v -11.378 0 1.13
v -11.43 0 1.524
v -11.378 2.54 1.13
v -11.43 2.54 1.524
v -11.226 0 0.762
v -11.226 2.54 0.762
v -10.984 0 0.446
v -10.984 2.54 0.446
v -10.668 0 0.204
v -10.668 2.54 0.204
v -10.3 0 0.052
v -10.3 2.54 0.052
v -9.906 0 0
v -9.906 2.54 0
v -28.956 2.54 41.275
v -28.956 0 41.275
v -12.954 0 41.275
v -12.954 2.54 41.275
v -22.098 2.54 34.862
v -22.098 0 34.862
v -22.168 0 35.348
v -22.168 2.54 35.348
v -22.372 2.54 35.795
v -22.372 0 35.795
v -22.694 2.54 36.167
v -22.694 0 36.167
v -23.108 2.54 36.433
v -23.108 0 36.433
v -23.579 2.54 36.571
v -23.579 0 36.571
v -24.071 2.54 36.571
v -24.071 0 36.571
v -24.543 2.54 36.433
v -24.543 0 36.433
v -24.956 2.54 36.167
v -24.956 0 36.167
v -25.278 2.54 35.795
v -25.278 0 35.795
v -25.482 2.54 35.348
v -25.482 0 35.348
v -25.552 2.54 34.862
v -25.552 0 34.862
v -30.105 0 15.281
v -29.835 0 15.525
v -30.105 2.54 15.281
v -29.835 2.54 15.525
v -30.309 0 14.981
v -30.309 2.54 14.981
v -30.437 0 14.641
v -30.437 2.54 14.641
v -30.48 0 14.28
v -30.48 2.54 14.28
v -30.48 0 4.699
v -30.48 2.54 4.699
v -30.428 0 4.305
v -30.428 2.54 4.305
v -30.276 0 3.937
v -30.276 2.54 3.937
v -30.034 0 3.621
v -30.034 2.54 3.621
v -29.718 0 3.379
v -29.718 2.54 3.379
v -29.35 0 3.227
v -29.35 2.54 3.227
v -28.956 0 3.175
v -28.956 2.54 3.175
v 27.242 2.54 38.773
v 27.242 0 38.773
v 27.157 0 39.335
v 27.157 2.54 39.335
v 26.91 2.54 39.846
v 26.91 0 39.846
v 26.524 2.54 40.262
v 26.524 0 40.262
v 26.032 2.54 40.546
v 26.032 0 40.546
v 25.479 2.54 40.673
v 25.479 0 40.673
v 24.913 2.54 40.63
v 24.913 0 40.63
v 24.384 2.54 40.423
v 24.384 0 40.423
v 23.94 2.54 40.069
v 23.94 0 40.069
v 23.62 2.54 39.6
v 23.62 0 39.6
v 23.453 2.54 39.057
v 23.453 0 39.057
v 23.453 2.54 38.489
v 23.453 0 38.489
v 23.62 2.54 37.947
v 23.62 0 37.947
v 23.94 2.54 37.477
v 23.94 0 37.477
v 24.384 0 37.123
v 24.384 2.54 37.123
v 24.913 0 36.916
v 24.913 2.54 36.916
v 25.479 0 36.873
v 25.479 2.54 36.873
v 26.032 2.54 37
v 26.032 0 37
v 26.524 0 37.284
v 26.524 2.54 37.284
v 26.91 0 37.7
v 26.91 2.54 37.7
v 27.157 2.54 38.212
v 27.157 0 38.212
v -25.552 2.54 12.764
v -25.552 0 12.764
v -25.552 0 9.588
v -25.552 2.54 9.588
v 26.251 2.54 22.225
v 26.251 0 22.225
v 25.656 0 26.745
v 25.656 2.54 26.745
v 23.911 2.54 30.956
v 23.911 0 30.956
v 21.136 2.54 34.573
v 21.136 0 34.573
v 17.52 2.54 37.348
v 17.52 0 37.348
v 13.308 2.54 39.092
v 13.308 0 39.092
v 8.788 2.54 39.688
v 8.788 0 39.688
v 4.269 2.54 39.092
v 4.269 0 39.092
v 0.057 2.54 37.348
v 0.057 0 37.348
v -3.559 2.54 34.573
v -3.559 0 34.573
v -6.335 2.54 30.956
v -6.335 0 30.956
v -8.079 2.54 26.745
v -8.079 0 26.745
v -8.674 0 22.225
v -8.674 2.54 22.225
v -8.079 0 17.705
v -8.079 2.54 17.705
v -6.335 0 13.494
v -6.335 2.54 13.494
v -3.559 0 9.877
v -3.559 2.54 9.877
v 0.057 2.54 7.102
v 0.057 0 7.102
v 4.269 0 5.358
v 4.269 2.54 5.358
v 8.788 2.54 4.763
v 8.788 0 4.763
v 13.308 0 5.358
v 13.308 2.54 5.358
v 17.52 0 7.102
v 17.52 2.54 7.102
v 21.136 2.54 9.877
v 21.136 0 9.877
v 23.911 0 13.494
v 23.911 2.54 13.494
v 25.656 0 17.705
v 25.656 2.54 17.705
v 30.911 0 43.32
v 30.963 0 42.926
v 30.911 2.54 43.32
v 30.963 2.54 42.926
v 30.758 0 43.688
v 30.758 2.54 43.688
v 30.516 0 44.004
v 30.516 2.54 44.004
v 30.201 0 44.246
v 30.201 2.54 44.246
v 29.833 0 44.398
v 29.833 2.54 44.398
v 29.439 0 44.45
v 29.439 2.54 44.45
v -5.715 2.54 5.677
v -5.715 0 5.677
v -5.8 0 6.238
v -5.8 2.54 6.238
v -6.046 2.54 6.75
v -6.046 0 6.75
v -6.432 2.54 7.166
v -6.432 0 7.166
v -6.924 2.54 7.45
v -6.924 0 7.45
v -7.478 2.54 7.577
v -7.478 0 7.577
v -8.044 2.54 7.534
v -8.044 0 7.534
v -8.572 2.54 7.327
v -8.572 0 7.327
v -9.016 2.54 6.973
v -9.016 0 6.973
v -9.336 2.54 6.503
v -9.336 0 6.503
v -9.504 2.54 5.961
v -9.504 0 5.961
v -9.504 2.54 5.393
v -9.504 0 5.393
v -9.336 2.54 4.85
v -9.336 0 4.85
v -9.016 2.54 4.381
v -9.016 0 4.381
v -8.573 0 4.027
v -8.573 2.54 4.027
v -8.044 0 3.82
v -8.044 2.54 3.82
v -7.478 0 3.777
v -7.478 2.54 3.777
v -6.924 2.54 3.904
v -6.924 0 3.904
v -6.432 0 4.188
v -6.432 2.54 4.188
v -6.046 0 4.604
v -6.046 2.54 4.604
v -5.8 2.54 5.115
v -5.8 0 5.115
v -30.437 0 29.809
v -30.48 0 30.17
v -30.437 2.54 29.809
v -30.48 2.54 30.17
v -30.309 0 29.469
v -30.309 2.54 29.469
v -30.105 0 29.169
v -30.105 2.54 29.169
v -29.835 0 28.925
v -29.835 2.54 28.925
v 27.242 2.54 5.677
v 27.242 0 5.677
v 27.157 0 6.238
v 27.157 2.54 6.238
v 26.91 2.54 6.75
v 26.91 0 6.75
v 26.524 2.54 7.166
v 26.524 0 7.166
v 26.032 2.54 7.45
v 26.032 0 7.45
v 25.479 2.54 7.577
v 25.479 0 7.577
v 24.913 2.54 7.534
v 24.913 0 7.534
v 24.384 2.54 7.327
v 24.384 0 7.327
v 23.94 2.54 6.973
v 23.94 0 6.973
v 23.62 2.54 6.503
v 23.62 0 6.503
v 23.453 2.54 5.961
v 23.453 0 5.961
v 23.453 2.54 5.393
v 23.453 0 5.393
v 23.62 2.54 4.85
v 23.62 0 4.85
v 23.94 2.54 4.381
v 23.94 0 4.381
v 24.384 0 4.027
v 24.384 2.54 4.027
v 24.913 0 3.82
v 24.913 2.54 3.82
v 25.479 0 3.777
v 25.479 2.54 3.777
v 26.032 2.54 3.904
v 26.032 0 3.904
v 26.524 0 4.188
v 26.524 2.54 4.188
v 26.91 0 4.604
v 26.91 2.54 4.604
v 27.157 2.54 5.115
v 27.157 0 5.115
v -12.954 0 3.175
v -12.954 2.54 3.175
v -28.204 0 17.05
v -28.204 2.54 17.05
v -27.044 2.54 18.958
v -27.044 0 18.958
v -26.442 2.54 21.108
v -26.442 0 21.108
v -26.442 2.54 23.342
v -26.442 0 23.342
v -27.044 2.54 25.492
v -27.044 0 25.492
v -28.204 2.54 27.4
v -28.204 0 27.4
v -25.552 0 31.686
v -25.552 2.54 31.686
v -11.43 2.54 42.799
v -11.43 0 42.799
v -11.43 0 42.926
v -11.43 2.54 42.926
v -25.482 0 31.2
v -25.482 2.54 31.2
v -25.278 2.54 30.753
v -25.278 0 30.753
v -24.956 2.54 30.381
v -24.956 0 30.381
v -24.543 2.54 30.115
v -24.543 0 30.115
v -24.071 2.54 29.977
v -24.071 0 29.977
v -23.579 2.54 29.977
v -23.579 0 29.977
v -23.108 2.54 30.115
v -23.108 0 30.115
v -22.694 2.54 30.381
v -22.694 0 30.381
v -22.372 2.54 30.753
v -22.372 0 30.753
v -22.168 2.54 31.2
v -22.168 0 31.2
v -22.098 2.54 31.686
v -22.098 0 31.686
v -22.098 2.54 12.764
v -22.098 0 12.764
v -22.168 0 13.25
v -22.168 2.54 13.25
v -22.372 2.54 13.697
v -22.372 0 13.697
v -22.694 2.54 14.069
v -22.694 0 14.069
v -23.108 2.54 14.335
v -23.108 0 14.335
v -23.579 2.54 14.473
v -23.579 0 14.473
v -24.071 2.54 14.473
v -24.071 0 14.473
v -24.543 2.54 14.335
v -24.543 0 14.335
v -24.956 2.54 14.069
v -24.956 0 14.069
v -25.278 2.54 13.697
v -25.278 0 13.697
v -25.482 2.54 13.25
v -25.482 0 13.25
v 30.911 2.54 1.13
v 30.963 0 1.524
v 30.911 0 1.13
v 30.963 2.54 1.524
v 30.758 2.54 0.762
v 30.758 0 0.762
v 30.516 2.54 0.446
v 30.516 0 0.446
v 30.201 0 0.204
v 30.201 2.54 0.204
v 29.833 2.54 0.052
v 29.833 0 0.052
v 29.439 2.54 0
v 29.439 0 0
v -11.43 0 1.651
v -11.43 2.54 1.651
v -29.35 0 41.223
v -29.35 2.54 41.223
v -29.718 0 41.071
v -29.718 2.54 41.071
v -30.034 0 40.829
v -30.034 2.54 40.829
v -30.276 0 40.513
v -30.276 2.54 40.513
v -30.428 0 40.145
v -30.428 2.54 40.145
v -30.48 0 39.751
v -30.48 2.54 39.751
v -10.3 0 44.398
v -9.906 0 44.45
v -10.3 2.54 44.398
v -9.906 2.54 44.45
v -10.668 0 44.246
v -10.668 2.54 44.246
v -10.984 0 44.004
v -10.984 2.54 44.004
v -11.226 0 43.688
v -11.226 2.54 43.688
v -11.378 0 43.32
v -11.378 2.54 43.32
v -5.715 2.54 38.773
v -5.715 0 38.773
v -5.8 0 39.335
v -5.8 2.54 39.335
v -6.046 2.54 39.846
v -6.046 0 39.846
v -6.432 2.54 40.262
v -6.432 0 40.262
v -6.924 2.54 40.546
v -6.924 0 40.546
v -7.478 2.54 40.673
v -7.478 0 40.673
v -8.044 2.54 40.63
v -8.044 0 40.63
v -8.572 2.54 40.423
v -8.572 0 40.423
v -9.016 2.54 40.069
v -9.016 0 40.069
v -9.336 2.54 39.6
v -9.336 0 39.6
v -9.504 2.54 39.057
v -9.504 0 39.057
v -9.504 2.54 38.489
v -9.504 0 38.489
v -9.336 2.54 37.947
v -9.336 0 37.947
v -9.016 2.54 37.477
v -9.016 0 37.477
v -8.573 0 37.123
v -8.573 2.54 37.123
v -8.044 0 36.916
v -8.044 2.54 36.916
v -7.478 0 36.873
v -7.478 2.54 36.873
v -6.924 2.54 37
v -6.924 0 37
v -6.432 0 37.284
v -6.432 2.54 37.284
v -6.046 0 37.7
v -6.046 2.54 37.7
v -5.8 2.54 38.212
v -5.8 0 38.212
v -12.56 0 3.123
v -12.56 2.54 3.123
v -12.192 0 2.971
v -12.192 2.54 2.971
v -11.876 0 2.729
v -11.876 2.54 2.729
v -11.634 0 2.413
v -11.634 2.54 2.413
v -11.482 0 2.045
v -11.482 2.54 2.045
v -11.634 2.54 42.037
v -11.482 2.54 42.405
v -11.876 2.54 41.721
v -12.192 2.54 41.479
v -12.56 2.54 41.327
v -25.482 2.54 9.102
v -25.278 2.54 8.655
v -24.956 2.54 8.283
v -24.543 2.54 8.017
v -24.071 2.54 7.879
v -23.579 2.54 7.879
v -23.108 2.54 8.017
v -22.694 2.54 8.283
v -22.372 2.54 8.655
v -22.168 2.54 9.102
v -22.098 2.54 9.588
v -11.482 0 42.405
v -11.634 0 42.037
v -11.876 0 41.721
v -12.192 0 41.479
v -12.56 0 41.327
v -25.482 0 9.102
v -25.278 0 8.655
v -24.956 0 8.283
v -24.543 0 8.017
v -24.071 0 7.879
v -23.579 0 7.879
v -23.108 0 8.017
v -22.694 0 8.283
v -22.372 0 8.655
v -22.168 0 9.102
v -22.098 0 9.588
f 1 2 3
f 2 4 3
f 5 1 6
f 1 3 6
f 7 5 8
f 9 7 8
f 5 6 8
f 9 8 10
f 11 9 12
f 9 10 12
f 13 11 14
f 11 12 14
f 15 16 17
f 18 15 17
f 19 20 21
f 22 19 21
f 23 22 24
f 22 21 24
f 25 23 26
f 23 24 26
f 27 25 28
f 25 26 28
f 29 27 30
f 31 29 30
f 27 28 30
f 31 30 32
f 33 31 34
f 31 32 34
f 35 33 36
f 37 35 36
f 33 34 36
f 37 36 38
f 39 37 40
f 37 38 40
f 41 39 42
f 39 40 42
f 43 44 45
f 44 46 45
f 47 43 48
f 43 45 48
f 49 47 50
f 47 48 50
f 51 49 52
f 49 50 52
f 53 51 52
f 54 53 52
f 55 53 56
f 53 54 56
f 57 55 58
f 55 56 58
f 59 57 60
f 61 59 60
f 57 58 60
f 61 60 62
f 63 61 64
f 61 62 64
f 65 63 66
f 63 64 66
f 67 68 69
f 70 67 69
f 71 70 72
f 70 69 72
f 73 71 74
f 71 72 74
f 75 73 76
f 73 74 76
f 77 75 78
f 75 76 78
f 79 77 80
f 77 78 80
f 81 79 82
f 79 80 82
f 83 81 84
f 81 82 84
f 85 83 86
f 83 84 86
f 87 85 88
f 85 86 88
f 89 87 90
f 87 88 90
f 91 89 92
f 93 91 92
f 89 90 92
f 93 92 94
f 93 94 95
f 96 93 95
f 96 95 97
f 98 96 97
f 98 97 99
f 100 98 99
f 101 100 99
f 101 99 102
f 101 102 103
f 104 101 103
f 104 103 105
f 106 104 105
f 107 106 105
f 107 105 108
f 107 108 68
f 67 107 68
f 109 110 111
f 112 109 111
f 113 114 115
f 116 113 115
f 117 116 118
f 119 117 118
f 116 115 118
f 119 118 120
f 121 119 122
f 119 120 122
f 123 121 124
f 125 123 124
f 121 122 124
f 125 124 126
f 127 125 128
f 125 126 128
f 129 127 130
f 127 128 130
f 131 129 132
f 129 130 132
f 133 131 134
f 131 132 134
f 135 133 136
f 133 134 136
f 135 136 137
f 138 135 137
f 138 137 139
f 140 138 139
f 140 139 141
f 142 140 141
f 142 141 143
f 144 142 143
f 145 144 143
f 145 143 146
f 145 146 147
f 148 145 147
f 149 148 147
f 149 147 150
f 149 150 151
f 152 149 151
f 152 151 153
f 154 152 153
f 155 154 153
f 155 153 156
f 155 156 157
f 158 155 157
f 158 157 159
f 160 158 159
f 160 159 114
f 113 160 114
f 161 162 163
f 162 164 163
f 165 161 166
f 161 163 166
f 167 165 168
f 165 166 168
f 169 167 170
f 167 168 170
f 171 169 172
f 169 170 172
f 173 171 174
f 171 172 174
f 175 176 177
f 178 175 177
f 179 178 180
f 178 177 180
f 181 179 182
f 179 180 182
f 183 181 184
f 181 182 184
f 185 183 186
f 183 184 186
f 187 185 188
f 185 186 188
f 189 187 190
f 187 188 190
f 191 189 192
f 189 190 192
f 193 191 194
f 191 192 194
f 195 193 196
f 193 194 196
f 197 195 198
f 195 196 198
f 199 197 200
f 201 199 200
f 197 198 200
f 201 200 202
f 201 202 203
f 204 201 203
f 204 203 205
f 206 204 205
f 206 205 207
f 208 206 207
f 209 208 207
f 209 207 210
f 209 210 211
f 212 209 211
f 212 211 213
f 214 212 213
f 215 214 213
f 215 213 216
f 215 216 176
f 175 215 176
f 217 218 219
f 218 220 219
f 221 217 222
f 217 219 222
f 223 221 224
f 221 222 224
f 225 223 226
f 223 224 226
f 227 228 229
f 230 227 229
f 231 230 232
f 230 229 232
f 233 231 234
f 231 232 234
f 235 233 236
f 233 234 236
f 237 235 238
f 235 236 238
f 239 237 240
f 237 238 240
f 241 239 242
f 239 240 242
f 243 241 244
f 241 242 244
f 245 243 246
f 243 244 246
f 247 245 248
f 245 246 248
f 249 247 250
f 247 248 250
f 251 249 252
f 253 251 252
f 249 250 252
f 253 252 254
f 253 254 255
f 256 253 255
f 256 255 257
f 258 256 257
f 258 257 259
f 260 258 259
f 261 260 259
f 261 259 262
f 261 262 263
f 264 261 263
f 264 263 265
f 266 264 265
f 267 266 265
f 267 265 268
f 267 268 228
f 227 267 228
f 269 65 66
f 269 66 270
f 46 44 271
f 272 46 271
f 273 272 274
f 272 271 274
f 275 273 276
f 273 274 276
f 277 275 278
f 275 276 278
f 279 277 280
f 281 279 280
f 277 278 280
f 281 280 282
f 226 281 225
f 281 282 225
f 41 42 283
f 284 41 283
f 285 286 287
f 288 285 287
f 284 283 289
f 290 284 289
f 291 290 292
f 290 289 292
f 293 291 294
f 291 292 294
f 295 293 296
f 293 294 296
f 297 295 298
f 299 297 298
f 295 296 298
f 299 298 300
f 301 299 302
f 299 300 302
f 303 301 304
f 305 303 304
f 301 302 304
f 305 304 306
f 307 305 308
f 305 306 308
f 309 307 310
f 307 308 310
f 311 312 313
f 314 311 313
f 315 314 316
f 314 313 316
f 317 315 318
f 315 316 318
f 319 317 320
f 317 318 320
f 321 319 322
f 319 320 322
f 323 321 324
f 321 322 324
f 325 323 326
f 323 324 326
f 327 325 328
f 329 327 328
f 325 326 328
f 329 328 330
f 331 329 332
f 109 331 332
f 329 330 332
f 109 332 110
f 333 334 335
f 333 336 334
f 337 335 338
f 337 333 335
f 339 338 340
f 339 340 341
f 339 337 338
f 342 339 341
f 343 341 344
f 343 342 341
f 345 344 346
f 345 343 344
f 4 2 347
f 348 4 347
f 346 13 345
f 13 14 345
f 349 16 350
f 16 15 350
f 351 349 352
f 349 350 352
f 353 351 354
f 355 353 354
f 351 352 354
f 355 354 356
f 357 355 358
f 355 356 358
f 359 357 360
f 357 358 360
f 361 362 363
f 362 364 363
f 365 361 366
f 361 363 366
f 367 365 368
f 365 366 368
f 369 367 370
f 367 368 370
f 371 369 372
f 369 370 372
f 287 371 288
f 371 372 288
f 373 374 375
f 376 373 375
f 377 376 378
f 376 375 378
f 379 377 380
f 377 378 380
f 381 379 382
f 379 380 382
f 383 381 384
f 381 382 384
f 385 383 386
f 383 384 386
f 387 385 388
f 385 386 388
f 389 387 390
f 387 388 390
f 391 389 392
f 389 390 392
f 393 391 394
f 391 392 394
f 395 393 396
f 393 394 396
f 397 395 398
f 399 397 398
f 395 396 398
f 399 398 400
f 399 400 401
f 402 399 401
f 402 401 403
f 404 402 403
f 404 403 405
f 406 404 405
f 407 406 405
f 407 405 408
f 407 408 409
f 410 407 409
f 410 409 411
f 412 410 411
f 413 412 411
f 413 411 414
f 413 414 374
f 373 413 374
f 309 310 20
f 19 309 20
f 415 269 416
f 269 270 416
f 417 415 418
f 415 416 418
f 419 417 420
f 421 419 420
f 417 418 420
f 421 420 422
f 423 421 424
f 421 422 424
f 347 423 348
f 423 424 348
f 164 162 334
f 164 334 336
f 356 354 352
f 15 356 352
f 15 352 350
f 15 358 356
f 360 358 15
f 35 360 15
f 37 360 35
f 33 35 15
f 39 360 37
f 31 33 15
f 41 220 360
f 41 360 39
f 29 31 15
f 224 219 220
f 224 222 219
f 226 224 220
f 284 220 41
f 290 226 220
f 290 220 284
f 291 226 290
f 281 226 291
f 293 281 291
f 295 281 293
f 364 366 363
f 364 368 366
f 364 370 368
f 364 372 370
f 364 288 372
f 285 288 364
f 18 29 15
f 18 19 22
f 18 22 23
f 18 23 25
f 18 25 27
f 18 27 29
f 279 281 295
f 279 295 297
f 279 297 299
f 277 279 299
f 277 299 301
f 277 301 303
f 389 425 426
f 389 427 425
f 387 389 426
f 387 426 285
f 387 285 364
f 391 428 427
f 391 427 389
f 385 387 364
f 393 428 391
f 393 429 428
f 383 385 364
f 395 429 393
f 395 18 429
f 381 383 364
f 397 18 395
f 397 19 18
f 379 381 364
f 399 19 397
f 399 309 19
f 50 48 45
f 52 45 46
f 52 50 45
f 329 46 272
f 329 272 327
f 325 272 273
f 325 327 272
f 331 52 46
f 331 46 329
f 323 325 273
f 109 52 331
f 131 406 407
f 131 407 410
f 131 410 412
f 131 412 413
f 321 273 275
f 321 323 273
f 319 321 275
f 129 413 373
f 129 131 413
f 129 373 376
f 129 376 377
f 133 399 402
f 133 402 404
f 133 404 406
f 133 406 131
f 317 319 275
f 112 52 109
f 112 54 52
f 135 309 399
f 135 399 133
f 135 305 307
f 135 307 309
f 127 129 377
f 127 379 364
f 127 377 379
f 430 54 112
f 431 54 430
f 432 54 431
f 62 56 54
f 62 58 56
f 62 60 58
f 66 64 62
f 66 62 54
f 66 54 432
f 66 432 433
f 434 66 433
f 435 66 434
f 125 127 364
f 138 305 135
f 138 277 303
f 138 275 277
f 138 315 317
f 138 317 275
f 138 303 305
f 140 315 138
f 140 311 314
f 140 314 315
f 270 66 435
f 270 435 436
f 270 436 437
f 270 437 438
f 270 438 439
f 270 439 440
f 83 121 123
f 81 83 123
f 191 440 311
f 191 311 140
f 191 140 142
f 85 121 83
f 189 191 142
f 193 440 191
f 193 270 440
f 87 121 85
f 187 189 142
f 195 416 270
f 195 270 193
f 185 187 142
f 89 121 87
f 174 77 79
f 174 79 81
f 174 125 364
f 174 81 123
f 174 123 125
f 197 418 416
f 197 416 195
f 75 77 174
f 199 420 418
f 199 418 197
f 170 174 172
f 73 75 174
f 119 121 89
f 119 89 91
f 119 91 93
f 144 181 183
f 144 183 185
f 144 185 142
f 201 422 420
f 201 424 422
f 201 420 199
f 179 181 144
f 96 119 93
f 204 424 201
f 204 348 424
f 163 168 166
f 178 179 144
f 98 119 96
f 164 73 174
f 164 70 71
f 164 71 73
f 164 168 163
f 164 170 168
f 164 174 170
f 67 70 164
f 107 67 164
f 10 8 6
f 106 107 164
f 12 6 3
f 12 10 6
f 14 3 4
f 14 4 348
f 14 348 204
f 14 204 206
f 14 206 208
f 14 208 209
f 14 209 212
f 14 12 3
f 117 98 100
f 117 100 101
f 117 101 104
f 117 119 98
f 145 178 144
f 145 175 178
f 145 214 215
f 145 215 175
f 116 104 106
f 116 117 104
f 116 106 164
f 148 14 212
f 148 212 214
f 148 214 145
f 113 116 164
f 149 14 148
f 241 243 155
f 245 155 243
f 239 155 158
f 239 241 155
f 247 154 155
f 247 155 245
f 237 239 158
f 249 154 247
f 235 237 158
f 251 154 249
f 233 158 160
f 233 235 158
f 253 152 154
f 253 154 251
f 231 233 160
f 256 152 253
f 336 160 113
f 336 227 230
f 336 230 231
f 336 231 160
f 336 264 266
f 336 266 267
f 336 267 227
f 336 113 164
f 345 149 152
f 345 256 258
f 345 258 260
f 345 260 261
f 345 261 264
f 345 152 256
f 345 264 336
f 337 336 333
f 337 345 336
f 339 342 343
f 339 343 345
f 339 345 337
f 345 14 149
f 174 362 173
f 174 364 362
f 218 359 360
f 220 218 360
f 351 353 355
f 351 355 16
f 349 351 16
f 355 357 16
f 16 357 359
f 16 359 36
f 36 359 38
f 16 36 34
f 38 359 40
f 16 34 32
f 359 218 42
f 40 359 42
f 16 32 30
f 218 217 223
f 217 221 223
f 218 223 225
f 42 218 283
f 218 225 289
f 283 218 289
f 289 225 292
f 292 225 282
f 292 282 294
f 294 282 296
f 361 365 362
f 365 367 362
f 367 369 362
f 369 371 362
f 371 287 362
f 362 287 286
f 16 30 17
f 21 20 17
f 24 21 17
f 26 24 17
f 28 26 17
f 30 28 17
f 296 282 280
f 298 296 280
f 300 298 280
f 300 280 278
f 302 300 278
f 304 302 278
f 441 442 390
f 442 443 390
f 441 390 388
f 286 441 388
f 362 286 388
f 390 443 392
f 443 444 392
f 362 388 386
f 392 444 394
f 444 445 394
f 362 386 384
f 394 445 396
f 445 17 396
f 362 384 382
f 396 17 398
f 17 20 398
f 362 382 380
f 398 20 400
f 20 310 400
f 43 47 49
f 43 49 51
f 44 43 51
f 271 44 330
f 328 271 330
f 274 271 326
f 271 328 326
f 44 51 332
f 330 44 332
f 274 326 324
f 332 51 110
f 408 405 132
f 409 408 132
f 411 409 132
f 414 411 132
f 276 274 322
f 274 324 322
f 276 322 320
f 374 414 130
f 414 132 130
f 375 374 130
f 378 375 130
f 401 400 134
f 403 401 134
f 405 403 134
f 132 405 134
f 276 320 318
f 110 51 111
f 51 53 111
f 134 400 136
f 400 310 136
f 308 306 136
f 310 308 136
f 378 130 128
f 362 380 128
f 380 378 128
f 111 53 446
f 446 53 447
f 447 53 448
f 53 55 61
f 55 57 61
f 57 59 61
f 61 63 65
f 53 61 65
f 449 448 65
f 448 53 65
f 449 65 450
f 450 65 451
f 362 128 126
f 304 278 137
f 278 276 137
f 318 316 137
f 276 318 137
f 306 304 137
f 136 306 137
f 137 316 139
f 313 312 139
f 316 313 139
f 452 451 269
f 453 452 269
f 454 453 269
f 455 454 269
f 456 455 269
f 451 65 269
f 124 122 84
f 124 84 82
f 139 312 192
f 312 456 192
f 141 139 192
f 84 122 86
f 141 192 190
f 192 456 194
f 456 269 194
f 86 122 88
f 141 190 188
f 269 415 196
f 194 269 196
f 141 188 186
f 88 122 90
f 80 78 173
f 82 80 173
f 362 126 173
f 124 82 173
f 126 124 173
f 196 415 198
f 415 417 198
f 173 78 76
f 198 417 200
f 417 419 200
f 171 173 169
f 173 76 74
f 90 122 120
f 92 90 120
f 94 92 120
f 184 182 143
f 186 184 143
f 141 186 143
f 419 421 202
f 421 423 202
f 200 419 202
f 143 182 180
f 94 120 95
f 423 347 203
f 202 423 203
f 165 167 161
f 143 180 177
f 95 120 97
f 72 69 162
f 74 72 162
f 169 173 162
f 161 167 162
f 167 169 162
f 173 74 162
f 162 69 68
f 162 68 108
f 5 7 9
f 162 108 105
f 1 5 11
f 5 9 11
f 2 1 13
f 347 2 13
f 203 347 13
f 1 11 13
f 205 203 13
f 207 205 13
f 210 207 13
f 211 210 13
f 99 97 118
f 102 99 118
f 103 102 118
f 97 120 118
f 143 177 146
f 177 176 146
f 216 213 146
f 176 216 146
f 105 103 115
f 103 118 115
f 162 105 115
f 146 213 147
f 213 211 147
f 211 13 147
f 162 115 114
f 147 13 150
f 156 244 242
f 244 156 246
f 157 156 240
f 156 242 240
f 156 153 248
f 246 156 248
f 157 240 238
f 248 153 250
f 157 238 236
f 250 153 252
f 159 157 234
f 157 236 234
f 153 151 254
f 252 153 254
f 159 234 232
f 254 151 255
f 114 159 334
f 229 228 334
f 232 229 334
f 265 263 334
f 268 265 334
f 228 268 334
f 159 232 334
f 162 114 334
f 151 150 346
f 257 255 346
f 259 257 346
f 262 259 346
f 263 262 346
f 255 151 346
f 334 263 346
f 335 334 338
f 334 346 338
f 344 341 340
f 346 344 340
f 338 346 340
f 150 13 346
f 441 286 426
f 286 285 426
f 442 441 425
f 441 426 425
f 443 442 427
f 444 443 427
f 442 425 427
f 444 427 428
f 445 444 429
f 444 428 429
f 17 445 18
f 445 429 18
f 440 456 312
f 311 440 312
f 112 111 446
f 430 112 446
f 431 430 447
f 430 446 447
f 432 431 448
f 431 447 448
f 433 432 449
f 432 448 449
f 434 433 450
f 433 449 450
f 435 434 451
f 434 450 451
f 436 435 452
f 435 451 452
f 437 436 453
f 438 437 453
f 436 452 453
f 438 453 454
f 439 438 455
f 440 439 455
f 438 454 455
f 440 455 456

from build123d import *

# Parameters (mm, degrees)
F0_W     = 30.48
F0_H     = 2.54
F1_DEPTH = 44.45
F0_W_2   = 30.9626
F3_DEPTH = 44.45
F4_R     = 1.905
F4_R_2   = 17.4625
F5_DEPTH = 25.4
F2_W     = 19.05
F2_H     = 3.175
F6_DEPTH = 25.4
F7_R     = 1.524


# Not quite as in the source:
# - a feature names something its author has since deleted; it is built from what else it names


with BuildPart() as f1:
    # F0 (on Top) → F1 (new body)
    with BuildSketch(Plane.XY):
        with Locations((-15.24, 1.27)):
            Rectangle(F0_W, F0_H)
    extrude(amount=F1_DEPTH)

    # F0 (on Top) → F3 (join)
    with BuildSketch(Plane.XY):
        with Locations((15.4813, 1.27)):
            Rectangle(F0_W_2, F0_H)
    extrude(amount=F3_DEPTH)

    # F4 (on face) + F2 (on face) → F5 (cut)
    with BuildSketch(Plane.XZ):
        with Locations((-7.62, 38.7731)):
            Circle(F4_R)
        with Locations((-7.62, 5.6769)):
            Circle(F4_R)
        with Locations((25.3365, 38.7731)):
            Circle(F4_R)
        with Locations((25.3365, 5.6769)):
            Circle(F4_R)
        with Locations((8.7884, 22.225)):
            Circle(F4_R_2)
    with BuildSketch(Plane.XZ):
        with BuildLine():
            Line((-22.098, 9.5885), (-22.098, 12.7635))
            ThreePointArc((-22.098, 12.7635), (-23.8252, 14.4907), (-25.5524, 12.7635))
            Line((-25.5524, 12.7635), (-25.5524, 9.5885))
            ThreePointArc((-25.5524, 9.5885), (-23.8252, 7.8613), (-22.098, 9.5885))
        make_face()
        with BuildLine():
            Line((-22.098, 31.6865), (-22.098, 34.8615))
            ThreePointArc((-22.098, 34.8615), (-23.8252, 36.5887), (-25.5524, 34.8615))
            Line((-25.5524, 34.8615), (-25.5524, 31.6865))
            ThreePointArc((-25.5524, 31.6865), (-23.8252, 29.9593), (-22.098, 31.6865))
        make_face()
        with BuildLine():
            Line((-30.48, 29.337), (-30.48, 15.113))
            ThreePointArc((-30.48, 15.113), (-26.3652, 22.225), (-30.48, 29.337))
        make_face()
    extrude(amount=-F5_DEPTH, mode=Mode.SUBTRACT)

    # F2 (on face) → F6 (cut)
    with BuildSketch(Plane.XZ):
        with Locations((-20.955, 42.8625)):
            Rectangle(F2_W, F2_H)
        with Locations((-20.955, 1.5875)):
            Rectangle(F2_W, F2_H)
    extrude(amount=-F6_DEPTH, mode=Mode.SUBTRACT)

    # F7
    f7_edges = [f1.edges().sort_by_distance(p)[0] for p in [
        (-11.43, 1.27, 41.275),
        (-11.43, 1.27, 44.45),
        (-11.43, 1.27, 0),
        (-11.43, 1.27, 3.175),
        (-30.48, 1.27, 3.175),
        (-30.48, 1.27, 29.337),
        (-30.48, 1.27, 15.113),
        (-30.48, 1.27, 41.275),
        (30.9626, 1.27, 0),
        (30.9626, 1.27, 44.45),
    ]]
    fillet(f7_edges, radius=F7_R)


solid = f1.part
